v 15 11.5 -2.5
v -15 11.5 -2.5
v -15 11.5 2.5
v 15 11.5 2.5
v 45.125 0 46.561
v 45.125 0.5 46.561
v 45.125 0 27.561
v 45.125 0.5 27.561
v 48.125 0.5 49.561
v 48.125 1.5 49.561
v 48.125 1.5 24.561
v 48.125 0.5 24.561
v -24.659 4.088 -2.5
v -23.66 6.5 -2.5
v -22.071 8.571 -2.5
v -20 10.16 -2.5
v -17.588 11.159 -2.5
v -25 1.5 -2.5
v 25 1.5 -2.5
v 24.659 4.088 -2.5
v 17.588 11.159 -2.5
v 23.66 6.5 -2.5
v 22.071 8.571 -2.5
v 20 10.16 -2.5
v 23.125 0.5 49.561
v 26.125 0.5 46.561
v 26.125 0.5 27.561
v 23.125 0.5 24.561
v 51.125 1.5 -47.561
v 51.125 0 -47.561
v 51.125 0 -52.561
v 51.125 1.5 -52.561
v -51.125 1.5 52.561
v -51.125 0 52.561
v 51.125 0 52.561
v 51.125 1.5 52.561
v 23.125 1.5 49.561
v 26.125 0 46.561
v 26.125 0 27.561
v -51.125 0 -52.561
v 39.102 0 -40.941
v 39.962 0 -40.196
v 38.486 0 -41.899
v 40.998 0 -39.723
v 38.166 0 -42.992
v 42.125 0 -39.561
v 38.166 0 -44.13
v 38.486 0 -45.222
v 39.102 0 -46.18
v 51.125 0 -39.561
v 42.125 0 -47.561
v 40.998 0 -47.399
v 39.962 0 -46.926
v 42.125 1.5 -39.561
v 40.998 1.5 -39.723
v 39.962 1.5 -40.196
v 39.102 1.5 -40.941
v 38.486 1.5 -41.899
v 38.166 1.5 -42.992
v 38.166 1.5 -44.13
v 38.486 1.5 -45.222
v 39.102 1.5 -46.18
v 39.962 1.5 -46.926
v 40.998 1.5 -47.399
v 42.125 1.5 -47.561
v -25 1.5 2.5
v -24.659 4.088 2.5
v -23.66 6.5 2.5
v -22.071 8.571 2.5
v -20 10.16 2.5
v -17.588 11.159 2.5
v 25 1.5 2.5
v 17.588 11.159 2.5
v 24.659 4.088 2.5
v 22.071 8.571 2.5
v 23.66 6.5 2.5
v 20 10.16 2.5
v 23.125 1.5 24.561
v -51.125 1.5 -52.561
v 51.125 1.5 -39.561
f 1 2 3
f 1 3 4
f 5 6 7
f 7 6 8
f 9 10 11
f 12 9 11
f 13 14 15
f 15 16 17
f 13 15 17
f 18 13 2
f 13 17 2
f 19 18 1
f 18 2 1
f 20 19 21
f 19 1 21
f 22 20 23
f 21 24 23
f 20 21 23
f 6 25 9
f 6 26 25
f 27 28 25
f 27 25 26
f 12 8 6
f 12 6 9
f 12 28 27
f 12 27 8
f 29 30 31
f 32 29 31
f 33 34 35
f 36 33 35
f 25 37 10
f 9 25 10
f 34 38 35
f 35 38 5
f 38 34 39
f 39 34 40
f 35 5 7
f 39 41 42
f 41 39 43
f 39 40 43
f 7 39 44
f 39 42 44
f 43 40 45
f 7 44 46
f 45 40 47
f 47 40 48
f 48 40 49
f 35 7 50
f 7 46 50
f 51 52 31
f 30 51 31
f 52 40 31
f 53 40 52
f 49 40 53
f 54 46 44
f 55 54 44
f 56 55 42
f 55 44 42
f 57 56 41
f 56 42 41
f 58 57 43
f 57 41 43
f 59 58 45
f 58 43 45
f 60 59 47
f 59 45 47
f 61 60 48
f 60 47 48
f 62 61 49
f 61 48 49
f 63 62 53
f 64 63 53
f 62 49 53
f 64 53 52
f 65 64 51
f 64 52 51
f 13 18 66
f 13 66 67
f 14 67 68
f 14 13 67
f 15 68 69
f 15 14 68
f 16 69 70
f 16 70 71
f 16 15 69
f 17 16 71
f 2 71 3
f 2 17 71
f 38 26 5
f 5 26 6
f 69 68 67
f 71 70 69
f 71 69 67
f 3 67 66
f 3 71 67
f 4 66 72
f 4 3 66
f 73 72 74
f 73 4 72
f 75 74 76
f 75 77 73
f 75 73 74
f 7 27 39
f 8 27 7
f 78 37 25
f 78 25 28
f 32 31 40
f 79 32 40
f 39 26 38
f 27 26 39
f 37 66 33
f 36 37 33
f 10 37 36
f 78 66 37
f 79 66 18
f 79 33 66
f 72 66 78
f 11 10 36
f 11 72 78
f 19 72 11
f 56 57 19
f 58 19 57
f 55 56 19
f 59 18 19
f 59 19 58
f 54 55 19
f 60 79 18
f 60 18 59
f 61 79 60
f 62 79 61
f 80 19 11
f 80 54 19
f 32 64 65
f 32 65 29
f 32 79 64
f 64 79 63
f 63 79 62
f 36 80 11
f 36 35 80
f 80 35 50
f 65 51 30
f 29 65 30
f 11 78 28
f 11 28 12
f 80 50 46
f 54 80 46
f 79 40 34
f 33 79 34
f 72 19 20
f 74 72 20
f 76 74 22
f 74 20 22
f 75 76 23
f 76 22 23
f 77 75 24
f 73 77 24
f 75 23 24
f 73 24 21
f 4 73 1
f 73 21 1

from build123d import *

# Parameters (mm, degrees)
BOSS_EXTRUDE1_DEPTH = 1.5
SKETCH2_W           = 30
SKETCH2_H           = 5
BOSS_EXTRUDE2_DEPTH = 10
SKETCH3_W           = 10
SKETCH3_H           = 5
REVOLVE_THIN1_ANGLE = 180
SKETCH5_W           = 25
SKETCH5_H           = 25
CUT_EXTRUDE1_DEPTH  = 1
SKETCH6_W           = 19
SKETCH6_H           = 19
CUT_EXTRUDE2_DEPTH  = 3


with BuildPart() as part:
    # Sketch1 → Boss-Extrude1 (new body)
    with BuildSketch(Plane(origin=(0, 0, 0), x_dir=(1, 0, 0), z_dir=(0, 1, 0))):
        with BuildLine():
            ThreePointArc((42.125, 39.560795807), (38.125, 43.560795807), (42.125, 47.560795807))
            Line((42.125, 47.560795807), (51.125, 47.560795807))
            Line((51.125, 47.560795807), (51.125, 52.560795807))
            Line((51.125, 52.560795807), (-51.125, 52.560795807))
            Line((-51.125, 52.560795807), (-51.125, -52.560795807))
            Line((-51.125, -52.560795807), (51.125, -52.560795807))
            Line((51.125, -52.560795807), (51.125, 39.560795807))
            Line((51.125, 39.560795807), (42.125, 39.560795807))
        make_face()
    extrude(amount=BOSS_EXTRUDE1_DEPTH)

    # Sketch2 → Boss-Extrude2 (add)
    with BuildSketch(Plane(origin=(0, 1.5, 0), x_dir=(1, 0, 0), z_dir=(0, 1, 0))):
        Rectangle(SKETCH2_W, SKETCH2_H)
    extrude(amount=BOSS_EXTRUDE2_DEPTH)

    # Sketch3 → Revolve-Thin1 (revolve)
    with BuildSketch(Plane(origin=(0, 1.5, 0), x_dir=(1, 0, 0), z_dir=(0, 1, 0))):
        with Locations((-20, 0)):
            Rectangle(SKETCH3_W, SKETCH3_H)
    revolve_thin1 = revolve(axis=Axis((-15, 1.5, 2.5), (0, 0, -1)), revolution_arc=REVOLVE_THIN1_ANGLE)

    # Mirror1: Revolve-Thin1 across plane
    add(revolve_thin1.mirror(Plane(origin=(0, 0, 0), x_dir=(0, 0, 1), z_dir=(1, 0, 0))))

    # Sketch5 → Cut-Extrude1 (cut)
    with BuildSketch(Plane(origin=(0, 1.5, 0), x_dir=(1, 0, 0), z_dir=(0, 1, 0))):
        with Locations((35.625, -37.060795807)):
            Rectangle(SKETCH5_W, SKETCH5_H)
    extrude(amount=-CUT_EXTRUDE1_DEPTH, mode=Mode.SUBTRACT)

    # Sketch6 → Cut-Extrude2 (cut)
    with BuildSketch(Plane(origin=(0, 0.5, 0), x_dir=(1, 0, 0), z_dir=(0, 1, 0))):
        with Locations((35.625, -37.060795807)):
            Rectangle(SKETCH6_W, SKETCH6_H)
    extrude(amount=-CUT_EXTRUDE2_DEPTH, mode=Mode.SUBTRACT)


solid = part.part
